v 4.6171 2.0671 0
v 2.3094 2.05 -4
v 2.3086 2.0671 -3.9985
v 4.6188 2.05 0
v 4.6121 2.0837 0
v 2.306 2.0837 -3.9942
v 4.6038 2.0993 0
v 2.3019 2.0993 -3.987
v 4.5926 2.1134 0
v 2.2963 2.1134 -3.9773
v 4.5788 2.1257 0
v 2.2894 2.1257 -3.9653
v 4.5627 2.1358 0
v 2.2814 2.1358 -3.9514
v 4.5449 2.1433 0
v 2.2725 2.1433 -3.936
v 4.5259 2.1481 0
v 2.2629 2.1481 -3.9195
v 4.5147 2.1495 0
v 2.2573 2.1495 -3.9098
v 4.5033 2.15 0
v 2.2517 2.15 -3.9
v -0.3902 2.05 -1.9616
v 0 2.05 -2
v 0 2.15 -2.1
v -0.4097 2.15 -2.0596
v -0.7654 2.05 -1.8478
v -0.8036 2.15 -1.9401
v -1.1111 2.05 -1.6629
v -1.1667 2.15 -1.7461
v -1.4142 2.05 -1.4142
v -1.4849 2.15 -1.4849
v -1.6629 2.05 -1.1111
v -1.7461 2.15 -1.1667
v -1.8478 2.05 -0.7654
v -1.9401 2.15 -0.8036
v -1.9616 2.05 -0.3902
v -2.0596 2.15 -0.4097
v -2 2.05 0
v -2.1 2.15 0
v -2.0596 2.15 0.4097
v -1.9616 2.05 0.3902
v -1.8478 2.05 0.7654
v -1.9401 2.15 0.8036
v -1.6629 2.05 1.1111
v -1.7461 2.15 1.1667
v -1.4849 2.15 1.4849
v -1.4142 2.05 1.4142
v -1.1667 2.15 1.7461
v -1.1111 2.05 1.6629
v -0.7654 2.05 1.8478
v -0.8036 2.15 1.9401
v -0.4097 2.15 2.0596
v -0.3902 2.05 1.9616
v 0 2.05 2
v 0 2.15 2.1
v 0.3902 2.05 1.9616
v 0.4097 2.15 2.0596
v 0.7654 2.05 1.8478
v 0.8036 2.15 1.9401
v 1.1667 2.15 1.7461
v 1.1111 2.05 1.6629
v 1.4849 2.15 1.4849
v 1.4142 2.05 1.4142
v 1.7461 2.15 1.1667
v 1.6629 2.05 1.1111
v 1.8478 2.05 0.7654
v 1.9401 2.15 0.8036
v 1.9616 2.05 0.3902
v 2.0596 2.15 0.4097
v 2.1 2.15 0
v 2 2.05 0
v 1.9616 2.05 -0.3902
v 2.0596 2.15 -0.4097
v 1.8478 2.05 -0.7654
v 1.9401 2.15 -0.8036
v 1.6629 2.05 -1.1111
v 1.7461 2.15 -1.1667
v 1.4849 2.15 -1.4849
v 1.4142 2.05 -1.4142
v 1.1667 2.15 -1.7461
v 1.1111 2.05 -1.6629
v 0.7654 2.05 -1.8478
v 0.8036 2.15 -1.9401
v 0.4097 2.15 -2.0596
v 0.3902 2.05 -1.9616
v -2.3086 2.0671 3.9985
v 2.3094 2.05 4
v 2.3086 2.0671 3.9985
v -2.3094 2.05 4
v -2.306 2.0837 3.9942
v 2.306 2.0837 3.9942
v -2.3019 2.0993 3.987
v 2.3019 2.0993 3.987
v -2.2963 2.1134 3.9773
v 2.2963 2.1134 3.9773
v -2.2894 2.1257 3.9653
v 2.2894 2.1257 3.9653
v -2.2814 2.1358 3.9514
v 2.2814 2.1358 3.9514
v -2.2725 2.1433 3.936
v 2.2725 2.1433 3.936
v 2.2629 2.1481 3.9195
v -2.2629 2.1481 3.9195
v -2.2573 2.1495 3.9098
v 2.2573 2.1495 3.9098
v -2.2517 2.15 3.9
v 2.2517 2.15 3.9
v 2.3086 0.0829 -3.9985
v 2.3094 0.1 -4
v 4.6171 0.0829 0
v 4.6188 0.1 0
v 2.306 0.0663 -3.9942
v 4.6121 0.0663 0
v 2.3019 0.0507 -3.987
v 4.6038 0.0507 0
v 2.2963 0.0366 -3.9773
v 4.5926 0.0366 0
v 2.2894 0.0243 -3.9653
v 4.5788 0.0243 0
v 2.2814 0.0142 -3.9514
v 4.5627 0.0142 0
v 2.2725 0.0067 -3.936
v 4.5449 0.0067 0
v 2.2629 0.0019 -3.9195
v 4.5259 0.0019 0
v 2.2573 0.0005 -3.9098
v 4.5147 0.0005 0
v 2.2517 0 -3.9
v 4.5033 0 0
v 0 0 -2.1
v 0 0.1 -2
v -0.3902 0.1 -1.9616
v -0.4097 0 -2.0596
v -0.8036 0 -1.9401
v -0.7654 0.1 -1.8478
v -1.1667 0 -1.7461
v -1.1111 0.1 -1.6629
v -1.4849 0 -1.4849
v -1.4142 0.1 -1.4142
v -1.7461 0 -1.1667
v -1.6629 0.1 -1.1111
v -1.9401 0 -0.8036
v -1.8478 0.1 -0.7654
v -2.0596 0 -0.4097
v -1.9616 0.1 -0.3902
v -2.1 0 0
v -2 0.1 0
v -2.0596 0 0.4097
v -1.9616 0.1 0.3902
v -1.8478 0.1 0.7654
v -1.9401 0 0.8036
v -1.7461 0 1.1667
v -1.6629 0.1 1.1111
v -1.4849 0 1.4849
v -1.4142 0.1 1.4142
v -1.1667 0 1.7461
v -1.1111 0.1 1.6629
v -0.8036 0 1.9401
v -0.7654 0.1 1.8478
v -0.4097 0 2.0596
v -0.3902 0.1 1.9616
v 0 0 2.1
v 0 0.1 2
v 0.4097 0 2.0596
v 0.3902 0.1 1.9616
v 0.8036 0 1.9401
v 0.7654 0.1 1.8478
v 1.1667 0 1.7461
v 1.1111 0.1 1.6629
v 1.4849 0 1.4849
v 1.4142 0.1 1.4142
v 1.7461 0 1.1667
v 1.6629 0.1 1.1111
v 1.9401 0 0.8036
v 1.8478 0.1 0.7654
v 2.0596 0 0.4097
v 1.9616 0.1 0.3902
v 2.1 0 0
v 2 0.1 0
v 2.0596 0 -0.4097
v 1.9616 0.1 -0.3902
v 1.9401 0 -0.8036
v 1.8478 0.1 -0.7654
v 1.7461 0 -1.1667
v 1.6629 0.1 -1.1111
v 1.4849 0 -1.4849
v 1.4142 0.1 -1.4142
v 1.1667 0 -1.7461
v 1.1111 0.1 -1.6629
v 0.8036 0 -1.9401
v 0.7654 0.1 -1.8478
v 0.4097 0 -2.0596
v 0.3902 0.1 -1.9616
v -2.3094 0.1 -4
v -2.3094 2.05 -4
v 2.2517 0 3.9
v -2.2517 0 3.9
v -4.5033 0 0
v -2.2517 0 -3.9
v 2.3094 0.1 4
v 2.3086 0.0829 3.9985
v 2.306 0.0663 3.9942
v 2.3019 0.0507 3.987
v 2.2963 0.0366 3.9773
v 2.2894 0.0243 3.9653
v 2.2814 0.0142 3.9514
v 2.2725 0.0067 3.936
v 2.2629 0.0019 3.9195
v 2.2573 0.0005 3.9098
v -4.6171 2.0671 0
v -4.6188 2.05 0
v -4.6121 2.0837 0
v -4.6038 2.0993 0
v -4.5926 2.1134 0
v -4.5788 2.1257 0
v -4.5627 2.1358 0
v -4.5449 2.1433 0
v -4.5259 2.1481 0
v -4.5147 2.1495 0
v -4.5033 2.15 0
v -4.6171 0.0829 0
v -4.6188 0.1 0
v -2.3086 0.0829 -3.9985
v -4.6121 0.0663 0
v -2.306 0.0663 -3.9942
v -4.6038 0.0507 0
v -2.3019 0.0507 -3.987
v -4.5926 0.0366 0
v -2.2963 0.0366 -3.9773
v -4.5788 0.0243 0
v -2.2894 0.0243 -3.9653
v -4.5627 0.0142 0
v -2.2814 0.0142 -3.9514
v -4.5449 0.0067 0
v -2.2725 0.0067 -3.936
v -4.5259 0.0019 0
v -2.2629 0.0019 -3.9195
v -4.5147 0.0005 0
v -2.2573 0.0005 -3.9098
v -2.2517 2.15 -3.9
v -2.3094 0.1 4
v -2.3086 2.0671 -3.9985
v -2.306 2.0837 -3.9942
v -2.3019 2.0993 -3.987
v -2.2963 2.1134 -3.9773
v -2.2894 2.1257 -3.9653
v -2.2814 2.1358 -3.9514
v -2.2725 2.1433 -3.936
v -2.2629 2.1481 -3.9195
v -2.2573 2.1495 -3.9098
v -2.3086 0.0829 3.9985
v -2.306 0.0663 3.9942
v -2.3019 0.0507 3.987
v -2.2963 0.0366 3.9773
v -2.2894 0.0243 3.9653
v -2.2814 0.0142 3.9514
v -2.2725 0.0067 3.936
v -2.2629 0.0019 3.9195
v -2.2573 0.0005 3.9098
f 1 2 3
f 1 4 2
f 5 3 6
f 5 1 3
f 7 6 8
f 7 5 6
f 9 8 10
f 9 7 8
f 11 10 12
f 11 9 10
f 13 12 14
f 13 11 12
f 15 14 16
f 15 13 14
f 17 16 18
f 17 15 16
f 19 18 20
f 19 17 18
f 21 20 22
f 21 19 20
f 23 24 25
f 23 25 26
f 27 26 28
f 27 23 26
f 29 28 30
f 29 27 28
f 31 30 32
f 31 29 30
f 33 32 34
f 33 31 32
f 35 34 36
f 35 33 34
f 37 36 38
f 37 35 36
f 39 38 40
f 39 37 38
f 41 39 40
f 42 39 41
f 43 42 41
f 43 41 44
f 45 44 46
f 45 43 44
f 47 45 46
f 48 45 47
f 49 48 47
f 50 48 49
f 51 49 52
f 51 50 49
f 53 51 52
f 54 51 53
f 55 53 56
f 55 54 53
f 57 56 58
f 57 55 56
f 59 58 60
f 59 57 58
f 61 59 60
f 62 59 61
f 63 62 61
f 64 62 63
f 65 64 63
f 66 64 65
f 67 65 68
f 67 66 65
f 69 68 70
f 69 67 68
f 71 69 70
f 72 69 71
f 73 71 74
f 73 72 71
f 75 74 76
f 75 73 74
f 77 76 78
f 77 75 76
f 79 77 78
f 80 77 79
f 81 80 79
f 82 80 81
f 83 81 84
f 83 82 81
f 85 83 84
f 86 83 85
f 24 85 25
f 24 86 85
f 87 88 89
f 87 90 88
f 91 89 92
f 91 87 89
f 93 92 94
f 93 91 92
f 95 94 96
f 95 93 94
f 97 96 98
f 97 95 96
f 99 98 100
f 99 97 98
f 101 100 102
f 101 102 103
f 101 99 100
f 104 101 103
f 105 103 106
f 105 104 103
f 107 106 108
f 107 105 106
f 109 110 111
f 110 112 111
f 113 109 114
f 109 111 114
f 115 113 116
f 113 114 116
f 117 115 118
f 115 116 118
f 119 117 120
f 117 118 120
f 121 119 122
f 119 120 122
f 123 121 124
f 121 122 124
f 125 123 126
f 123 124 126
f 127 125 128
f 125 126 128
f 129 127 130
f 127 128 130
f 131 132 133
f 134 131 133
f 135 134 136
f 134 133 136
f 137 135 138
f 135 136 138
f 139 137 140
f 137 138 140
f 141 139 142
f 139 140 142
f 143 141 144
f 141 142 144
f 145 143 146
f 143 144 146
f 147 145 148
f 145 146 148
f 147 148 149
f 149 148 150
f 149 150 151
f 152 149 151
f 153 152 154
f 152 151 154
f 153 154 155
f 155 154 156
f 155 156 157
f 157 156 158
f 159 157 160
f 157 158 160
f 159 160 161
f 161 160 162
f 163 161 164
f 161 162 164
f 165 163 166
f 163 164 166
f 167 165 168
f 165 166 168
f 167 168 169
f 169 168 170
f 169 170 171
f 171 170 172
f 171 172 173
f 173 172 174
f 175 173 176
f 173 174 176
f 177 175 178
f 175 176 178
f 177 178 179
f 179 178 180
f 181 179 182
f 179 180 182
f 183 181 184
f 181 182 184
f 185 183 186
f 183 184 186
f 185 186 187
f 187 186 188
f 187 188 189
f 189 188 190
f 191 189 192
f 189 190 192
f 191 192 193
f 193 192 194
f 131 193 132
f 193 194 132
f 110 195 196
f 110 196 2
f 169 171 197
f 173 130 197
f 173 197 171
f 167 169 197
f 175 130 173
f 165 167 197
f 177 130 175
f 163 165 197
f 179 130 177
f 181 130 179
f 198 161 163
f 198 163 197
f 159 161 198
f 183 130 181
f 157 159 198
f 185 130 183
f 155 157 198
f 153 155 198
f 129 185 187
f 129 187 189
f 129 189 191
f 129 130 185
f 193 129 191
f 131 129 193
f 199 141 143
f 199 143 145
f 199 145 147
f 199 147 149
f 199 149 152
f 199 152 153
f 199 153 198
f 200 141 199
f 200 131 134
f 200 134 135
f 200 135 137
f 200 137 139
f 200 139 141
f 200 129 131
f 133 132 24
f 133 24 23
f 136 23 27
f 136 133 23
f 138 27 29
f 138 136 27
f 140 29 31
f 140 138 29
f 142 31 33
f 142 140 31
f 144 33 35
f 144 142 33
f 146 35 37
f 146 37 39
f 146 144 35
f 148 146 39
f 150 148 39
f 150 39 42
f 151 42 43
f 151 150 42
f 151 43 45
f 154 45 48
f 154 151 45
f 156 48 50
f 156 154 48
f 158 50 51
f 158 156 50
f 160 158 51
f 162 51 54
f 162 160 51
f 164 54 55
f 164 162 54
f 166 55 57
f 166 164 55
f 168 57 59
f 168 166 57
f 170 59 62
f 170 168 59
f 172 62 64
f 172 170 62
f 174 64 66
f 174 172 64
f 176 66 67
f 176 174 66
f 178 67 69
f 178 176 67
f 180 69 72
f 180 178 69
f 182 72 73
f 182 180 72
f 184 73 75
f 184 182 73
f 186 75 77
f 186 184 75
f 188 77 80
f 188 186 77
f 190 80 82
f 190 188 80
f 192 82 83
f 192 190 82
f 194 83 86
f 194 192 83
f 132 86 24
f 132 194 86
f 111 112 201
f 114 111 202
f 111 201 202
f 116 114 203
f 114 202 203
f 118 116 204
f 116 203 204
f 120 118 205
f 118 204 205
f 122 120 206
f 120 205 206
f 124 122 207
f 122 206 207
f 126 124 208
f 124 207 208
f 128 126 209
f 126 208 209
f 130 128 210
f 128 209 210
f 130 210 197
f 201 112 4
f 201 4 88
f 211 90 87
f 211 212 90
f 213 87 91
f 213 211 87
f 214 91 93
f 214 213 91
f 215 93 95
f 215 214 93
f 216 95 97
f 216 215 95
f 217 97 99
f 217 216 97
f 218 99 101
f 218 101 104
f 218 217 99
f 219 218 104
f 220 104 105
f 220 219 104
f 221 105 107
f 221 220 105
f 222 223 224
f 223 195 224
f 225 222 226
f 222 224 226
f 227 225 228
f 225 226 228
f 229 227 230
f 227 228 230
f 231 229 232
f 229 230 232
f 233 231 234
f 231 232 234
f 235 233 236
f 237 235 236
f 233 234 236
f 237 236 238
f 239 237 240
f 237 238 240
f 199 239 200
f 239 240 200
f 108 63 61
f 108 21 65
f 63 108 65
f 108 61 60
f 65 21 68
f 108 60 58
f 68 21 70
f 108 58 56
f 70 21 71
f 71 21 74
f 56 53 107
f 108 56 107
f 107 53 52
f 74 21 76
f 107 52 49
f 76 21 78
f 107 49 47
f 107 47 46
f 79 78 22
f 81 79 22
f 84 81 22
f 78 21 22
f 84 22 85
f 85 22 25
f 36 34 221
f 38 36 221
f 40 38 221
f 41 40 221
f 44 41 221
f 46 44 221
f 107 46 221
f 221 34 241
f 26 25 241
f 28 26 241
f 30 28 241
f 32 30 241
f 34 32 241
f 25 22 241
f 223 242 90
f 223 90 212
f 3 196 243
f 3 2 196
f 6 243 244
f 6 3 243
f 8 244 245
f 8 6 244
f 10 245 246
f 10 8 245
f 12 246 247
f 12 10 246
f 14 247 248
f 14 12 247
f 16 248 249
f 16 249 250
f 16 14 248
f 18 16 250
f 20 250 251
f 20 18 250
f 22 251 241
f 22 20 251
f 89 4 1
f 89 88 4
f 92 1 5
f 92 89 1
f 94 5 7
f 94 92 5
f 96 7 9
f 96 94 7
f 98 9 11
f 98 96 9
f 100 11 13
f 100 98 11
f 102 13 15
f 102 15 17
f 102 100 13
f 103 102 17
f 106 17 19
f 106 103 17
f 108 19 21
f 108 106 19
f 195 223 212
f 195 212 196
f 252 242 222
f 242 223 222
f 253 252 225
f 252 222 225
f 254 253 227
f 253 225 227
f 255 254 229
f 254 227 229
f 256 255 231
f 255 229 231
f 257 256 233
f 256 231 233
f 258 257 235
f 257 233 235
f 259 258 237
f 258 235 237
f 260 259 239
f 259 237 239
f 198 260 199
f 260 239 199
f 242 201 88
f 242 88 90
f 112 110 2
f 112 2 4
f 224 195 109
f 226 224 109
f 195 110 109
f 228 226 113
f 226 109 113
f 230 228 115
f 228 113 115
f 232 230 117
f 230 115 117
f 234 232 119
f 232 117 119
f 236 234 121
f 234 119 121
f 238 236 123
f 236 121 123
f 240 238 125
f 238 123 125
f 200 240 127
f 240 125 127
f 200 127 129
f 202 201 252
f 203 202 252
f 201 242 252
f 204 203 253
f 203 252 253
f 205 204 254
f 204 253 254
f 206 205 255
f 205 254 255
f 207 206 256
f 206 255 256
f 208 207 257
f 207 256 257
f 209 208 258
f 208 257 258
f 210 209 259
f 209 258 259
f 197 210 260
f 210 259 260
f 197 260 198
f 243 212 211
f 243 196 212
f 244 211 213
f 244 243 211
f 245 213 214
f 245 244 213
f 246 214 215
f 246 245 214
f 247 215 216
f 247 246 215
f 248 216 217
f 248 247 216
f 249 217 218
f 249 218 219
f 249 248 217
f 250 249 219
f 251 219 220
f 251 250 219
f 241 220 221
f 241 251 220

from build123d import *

# Parameters (mm, degrees)
SKETCH1_R           = 2
BOSS_EXTRUDE1_DEPTH = 2.15
FILLET1_R           = 0.1
CHAMFER1_SIZE       = 0.1


with BuildPart() as part:
    # Sketch1 → Boss-Extrude1 (new body)
    with BuildSketch(Plane(origin=(0, 0, 0), x_dir=(1, 0, 0), z_dir=(0, 1, 0))):
        Polygon((-2.309401077, 4), (2.309401077, 4), (4.618802154, 0), (2.309401077, -4), (-2.309401077, -4), (-4.618802154, 0), align=None)
        with Locations(Location((0, 0, 0), (0, 0, 90))):
            Circle(SKETCH1_R, mode=Mode.SUBTRACT)
    extrude(amount=BOSS_EXTRUDE1_DEPTH)

    # Fillet1
    fillet1_edges = [part.edges().sort_by_distance(p)[0] for p in [
        (3.464101615, 2.15, -2),
        (3.464101615, 2.15, 2),
        (0, 2.15, 4),
        (-3.464101615, 2.15, 2),
        (-3.464101615, 2.15, -2),
        (-3.464101615, 0, 2),
        (0, 0, 4),
        (3.464101615, 0, 2),
        (3.464101615, 0, -2),
        (0, 0, -4),
        (-3.464101615, 0, -2),
        (0, 2.15, -4),
    ]]
    fillet(fillet1_edges, radius=FILLET1_R)

    # Chamfer1
    chamfer1_edges = [part.edges().sort_by_distance(p)[0] for p in [
        (0, 0, 2),
        (0, 2.15, 2),
    ]]
    chamfer(chamfer1_edges, length=CHAMFER1_SIZE)


solid = part.part
